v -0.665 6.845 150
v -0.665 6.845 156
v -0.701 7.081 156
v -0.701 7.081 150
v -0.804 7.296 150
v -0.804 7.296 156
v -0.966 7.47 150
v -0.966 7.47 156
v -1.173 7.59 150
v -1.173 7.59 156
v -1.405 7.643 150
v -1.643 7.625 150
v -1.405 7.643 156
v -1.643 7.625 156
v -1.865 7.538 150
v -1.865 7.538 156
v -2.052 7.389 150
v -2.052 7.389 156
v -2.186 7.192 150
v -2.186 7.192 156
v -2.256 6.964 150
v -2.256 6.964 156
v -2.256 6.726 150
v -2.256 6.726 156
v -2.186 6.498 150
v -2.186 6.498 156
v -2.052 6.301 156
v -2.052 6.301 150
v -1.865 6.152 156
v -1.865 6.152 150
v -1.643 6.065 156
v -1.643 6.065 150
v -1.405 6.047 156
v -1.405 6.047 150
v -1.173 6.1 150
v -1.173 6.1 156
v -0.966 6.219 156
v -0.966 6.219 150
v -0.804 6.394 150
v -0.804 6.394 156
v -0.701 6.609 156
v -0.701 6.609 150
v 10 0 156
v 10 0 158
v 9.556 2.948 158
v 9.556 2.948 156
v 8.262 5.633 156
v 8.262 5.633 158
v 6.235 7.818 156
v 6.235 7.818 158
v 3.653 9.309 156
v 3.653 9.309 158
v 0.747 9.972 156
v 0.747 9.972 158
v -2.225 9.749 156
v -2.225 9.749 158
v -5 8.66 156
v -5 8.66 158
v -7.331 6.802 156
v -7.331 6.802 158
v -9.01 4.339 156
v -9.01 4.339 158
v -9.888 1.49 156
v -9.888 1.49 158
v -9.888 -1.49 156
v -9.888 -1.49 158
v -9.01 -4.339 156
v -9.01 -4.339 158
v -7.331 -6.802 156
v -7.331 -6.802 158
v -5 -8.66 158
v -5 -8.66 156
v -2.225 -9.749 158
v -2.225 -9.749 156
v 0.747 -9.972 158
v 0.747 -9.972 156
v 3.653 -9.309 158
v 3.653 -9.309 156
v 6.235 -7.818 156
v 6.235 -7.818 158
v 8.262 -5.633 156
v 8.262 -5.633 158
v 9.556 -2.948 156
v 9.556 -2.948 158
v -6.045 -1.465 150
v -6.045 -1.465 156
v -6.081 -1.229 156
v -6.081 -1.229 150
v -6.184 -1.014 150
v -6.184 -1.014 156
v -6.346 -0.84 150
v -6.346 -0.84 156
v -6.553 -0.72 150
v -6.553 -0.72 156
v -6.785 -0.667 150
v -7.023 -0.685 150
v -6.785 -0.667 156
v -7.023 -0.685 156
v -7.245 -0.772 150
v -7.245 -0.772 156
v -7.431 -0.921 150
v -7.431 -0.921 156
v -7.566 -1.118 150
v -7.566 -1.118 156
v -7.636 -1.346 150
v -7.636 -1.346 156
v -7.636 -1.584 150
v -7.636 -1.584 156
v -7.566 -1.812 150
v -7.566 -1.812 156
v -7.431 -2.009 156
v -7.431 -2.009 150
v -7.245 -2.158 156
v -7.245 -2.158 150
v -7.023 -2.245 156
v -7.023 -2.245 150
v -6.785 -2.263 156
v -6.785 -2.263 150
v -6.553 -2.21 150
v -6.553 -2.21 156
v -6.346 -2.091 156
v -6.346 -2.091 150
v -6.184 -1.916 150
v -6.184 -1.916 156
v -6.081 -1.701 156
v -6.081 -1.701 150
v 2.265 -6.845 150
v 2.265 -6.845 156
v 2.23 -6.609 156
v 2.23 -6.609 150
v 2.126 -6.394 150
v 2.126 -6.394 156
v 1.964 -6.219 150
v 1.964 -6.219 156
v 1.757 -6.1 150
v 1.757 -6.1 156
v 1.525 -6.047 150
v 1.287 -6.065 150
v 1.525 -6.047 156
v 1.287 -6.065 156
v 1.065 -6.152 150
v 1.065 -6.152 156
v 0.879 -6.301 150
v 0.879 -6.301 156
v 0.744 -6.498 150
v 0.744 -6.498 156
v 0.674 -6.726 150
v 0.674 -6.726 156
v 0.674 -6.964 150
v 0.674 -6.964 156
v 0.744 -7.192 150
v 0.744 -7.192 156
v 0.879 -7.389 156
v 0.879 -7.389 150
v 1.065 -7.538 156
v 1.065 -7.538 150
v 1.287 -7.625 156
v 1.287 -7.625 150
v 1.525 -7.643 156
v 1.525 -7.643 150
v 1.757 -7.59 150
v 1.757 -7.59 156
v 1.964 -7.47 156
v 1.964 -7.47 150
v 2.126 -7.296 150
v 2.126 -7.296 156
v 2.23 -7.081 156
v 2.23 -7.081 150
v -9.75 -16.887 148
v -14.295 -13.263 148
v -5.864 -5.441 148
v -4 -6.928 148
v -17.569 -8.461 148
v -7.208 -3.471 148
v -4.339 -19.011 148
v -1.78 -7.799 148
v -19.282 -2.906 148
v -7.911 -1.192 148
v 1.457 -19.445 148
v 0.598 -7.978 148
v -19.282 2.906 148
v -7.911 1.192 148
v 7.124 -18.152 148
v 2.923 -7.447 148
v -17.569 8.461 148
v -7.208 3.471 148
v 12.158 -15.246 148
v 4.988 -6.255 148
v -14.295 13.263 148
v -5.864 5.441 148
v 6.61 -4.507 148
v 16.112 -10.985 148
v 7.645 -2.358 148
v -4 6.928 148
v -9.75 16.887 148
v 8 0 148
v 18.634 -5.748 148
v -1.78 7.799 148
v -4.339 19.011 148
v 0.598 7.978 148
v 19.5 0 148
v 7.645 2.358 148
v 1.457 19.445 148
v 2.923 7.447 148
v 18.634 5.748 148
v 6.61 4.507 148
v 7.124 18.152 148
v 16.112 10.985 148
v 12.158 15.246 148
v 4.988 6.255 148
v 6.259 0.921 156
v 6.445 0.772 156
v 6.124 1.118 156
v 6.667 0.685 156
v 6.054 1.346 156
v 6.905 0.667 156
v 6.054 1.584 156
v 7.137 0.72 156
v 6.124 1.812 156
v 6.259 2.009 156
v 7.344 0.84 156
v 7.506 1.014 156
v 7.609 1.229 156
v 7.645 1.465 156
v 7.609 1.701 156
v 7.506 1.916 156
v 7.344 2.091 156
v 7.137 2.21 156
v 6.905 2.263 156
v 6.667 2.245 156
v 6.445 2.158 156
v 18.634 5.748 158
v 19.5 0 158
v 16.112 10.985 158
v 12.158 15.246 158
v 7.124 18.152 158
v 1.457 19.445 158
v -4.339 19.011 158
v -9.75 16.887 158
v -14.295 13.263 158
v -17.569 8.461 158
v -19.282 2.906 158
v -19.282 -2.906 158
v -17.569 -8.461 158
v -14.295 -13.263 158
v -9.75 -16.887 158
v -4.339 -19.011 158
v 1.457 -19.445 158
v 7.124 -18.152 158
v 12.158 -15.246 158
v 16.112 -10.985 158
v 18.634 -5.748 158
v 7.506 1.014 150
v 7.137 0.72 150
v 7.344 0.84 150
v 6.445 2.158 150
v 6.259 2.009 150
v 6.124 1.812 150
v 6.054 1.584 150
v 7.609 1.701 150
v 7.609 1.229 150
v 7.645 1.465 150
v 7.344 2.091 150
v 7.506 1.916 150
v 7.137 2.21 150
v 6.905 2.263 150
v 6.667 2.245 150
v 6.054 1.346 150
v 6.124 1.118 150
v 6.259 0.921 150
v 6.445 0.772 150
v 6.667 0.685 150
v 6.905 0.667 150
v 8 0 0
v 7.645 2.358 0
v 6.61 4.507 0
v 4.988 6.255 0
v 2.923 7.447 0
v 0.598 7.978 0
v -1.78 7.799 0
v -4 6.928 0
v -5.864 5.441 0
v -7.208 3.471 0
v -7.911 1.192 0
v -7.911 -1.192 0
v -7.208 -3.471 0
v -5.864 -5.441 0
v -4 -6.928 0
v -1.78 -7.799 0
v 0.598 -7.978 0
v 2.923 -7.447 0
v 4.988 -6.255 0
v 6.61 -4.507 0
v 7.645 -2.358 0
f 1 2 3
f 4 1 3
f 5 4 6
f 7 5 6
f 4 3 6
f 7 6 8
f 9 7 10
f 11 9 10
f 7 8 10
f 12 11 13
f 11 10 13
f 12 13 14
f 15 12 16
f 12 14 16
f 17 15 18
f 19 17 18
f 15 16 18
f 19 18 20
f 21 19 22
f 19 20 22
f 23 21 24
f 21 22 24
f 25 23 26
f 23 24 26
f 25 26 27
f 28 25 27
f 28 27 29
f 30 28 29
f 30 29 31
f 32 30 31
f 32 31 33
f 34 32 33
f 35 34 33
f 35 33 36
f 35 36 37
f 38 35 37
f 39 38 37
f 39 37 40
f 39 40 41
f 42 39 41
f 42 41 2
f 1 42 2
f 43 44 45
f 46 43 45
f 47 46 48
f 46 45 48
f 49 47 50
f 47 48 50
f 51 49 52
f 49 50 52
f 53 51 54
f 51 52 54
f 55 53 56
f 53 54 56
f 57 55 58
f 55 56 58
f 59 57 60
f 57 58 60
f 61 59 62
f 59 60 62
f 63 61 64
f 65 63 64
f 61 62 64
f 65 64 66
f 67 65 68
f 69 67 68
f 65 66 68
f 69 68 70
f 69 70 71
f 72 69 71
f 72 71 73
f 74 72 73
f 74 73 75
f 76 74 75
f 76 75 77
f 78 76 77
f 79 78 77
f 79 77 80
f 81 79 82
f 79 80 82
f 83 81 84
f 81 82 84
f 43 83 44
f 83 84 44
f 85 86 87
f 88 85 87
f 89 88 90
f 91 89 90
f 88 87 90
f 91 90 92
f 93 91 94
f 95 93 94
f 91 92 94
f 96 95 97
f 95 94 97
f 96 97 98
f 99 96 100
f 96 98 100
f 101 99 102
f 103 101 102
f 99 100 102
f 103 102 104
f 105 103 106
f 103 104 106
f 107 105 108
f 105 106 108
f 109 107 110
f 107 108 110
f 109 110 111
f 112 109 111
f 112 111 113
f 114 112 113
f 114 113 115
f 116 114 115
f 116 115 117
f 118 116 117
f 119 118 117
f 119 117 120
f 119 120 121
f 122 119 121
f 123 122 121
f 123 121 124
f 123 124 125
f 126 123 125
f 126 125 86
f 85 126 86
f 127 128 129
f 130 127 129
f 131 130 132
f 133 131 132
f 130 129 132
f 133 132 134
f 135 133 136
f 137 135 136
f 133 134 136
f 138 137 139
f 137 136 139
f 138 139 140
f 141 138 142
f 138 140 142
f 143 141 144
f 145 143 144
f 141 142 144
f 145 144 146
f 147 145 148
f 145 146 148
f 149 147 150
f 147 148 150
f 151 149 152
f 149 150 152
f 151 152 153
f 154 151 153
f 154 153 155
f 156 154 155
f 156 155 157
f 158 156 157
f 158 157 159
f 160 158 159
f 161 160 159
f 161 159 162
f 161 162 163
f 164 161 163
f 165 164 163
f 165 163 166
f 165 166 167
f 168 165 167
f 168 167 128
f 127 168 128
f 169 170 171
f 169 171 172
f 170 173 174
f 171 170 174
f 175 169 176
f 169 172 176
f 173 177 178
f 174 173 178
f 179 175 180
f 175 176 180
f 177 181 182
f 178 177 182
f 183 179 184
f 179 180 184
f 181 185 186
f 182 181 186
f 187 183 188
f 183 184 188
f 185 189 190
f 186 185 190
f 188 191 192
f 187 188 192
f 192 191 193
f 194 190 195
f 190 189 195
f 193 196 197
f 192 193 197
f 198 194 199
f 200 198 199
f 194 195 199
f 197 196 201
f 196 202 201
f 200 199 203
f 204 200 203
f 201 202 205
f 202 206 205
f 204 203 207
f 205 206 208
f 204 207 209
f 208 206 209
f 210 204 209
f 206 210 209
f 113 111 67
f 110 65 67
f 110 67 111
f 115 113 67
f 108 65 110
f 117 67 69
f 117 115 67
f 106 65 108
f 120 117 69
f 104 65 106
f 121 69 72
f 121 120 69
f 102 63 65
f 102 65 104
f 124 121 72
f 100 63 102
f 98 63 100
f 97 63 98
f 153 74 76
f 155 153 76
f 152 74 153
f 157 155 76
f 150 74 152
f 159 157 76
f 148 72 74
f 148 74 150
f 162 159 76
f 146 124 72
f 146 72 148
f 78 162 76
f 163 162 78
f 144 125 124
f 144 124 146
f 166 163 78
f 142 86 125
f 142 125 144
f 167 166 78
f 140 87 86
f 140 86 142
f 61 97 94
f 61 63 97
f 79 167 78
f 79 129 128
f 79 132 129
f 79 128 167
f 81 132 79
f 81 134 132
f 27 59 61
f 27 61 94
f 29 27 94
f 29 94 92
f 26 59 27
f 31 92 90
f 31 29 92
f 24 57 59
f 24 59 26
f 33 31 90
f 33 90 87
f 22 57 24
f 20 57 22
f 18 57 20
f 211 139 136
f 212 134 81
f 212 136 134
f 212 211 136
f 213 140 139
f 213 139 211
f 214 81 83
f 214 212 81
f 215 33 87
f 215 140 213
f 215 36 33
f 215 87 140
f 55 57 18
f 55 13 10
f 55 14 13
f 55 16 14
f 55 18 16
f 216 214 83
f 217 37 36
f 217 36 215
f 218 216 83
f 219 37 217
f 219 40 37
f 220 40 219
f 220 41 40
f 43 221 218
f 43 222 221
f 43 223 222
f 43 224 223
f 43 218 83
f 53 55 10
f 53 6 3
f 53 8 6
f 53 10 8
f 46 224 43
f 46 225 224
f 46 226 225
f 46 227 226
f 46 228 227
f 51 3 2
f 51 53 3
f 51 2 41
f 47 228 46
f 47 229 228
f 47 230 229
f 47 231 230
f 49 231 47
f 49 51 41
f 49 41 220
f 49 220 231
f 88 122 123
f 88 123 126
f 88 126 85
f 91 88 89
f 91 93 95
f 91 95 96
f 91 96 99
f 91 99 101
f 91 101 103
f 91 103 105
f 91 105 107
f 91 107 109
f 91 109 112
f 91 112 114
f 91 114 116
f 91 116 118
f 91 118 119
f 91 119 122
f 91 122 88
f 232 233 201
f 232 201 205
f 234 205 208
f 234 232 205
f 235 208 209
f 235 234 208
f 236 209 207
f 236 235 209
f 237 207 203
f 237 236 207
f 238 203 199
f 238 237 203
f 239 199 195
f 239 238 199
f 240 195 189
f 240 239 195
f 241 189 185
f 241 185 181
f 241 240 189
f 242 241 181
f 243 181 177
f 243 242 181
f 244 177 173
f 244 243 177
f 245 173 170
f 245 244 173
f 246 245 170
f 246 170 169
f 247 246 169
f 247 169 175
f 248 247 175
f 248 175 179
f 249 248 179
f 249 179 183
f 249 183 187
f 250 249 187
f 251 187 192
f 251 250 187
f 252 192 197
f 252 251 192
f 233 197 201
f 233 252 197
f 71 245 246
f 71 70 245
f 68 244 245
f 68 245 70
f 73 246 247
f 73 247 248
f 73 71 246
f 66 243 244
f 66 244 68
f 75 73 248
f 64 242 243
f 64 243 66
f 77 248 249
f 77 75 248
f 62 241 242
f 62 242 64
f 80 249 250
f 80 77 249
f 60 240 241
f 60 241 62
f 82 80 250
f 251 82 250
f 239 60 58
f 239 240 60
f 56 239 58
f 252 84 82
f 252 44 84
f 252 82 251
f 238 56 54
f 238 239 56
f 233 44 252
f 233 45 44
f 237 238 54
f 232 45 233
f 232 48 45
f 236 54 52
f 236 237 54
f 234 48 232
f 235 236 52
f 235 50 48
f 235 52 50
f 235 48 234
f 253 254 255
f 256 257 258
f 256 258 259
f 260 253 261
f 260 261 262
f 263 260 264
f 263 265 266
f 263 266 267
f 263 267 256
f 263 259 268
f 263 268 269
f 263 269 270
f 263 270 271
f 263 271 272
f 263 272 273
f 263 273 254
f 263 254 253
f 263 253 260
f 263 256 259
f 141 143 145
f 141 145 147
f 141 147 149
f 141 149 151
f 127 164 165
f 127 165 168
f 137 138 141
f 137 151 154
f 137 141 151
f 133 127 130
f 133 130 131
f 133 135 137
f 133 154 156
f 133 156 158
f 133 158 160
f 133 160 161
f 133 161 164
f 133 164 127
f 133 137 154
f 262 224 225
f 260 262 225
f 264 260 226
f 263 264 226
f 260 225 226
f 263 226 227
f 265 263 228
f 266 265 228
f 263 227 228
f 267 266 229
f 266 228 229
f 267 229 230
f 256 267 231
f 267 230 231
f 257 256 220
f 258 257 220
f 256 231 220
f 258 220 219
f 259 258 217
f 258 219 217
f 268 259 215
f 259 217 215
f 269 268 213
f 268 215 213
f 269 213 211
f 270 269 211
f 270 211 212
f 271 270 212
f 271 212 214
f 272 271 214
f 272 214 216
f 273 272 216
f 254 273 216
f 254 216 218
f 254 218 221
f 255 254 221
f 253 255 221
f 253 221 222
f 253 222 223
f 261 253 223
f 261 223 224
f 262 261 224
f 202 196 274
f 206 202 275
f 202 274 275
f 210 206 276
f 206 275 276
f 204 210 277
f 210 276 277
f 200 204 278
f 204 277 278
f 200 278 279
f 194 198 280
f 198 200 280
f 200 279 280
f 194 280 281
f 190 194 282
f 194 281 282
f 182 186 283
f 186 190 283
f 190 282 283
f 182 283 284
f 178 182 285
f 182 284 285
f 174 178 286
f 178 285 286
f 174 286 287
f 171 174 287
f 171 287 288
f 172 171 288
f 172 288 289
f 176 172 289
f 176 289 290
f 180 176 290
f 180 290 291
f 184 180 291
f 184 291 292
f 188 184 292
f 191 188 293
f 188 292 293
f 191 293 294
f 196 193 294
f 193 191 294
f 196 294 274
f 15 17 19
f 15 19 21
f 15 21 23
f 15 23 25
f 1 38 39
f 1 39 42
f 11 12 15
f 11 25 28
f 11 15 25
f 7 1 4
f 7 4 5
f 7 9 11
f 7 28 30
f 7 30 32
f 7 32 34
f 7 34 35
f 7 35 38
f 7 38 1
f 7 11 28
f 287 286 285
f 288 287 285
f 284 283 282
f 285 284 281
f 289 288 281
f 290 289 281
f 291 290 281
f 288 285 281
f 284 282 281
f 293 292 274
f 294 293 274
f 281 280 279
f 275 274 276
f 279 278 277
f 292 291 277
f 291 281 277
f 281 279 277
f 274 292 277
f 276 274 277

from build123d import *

# Parameters (mm, degrees)
SKETCH1_R           = 8
BOSS_EXTRUDE1_DEPTH = 158
SKETCH2_R           = 19.5
BOSS_EXTRUDE2_DEPTH = 10
SKETCH3_R           = 10
SKETCH3_R_2         = 0.8
CUT_EXTRUDE1_DEPTH  = 2
SKETCH3_2_R         = 0.8
CUT_EXTRUDE2_DEPTH  = 8


with BuildPart() as part:
    # Sketch1 → Boss-Extrude1 (new body)
    with BuildSketch(Plane.XY):
        Circle(SKETCH1_R)
    extrude(amount=BOSS_EXTRUDE1_DEPTH)

    # Sketch2 → Boss-Extrude2 (add)
    with BuildSketch(Plane.XY.offset(158)):
        Circle(SKETCH2_R)
    extrude(amount=-BOSS_EXTRUDE2_DEPTH)

    # Sketch3 → Cut-Extrude1 (cut)
    with BuildSketch(Plane.XY.offset(158)):
        Circle(SKETCH3_R)
        with Locations((6.84496079, 1.465097875)):
            Circle(SKETCH3_R_2, mode=Mode.SUBTRACT)
        with Locations((-1.465097875, 6.84496079)):
            Circle(SKETCH3_R_2, mode=Mode.SUBTRACT)
        with Locations((-6.84496079, -1.465097875)):
            Circle(SKETCH3_R_2, mode=Mode.SUBTRACT)
        with Locations((1.465097875, -6.84496079)):
            Circle(SKETCH3_R_2, mode=Mode.SUBTRACT)
    extrude(amount=-CUT_EXTRUDE1_DEPTH, mode=Mode.SUBTRACT)

    # Sketch3<2> → Cut-Extrude2 (cut)
    with BuildSketch(Plane.XY.offset(158)):
        with Locations((6.84496079, 1.465097875)):
            Circle(SKETCH3_2_R)
        with Locations((-1.465097875, 6.84496079)):
            Circle(SKETCH3_2_R)
        with Locations((-6.84496079, -1.465097875)):
            Circle(SKETCH3_2_R)
        with Locations((1.465097875, -6.84496079)):
            Circle(SKETCH3_2_R)
    extrude(amount=-CUT_EXTRUDE2_DEPTH, mode=Mode.SUBTRACT)


solid = part.part
